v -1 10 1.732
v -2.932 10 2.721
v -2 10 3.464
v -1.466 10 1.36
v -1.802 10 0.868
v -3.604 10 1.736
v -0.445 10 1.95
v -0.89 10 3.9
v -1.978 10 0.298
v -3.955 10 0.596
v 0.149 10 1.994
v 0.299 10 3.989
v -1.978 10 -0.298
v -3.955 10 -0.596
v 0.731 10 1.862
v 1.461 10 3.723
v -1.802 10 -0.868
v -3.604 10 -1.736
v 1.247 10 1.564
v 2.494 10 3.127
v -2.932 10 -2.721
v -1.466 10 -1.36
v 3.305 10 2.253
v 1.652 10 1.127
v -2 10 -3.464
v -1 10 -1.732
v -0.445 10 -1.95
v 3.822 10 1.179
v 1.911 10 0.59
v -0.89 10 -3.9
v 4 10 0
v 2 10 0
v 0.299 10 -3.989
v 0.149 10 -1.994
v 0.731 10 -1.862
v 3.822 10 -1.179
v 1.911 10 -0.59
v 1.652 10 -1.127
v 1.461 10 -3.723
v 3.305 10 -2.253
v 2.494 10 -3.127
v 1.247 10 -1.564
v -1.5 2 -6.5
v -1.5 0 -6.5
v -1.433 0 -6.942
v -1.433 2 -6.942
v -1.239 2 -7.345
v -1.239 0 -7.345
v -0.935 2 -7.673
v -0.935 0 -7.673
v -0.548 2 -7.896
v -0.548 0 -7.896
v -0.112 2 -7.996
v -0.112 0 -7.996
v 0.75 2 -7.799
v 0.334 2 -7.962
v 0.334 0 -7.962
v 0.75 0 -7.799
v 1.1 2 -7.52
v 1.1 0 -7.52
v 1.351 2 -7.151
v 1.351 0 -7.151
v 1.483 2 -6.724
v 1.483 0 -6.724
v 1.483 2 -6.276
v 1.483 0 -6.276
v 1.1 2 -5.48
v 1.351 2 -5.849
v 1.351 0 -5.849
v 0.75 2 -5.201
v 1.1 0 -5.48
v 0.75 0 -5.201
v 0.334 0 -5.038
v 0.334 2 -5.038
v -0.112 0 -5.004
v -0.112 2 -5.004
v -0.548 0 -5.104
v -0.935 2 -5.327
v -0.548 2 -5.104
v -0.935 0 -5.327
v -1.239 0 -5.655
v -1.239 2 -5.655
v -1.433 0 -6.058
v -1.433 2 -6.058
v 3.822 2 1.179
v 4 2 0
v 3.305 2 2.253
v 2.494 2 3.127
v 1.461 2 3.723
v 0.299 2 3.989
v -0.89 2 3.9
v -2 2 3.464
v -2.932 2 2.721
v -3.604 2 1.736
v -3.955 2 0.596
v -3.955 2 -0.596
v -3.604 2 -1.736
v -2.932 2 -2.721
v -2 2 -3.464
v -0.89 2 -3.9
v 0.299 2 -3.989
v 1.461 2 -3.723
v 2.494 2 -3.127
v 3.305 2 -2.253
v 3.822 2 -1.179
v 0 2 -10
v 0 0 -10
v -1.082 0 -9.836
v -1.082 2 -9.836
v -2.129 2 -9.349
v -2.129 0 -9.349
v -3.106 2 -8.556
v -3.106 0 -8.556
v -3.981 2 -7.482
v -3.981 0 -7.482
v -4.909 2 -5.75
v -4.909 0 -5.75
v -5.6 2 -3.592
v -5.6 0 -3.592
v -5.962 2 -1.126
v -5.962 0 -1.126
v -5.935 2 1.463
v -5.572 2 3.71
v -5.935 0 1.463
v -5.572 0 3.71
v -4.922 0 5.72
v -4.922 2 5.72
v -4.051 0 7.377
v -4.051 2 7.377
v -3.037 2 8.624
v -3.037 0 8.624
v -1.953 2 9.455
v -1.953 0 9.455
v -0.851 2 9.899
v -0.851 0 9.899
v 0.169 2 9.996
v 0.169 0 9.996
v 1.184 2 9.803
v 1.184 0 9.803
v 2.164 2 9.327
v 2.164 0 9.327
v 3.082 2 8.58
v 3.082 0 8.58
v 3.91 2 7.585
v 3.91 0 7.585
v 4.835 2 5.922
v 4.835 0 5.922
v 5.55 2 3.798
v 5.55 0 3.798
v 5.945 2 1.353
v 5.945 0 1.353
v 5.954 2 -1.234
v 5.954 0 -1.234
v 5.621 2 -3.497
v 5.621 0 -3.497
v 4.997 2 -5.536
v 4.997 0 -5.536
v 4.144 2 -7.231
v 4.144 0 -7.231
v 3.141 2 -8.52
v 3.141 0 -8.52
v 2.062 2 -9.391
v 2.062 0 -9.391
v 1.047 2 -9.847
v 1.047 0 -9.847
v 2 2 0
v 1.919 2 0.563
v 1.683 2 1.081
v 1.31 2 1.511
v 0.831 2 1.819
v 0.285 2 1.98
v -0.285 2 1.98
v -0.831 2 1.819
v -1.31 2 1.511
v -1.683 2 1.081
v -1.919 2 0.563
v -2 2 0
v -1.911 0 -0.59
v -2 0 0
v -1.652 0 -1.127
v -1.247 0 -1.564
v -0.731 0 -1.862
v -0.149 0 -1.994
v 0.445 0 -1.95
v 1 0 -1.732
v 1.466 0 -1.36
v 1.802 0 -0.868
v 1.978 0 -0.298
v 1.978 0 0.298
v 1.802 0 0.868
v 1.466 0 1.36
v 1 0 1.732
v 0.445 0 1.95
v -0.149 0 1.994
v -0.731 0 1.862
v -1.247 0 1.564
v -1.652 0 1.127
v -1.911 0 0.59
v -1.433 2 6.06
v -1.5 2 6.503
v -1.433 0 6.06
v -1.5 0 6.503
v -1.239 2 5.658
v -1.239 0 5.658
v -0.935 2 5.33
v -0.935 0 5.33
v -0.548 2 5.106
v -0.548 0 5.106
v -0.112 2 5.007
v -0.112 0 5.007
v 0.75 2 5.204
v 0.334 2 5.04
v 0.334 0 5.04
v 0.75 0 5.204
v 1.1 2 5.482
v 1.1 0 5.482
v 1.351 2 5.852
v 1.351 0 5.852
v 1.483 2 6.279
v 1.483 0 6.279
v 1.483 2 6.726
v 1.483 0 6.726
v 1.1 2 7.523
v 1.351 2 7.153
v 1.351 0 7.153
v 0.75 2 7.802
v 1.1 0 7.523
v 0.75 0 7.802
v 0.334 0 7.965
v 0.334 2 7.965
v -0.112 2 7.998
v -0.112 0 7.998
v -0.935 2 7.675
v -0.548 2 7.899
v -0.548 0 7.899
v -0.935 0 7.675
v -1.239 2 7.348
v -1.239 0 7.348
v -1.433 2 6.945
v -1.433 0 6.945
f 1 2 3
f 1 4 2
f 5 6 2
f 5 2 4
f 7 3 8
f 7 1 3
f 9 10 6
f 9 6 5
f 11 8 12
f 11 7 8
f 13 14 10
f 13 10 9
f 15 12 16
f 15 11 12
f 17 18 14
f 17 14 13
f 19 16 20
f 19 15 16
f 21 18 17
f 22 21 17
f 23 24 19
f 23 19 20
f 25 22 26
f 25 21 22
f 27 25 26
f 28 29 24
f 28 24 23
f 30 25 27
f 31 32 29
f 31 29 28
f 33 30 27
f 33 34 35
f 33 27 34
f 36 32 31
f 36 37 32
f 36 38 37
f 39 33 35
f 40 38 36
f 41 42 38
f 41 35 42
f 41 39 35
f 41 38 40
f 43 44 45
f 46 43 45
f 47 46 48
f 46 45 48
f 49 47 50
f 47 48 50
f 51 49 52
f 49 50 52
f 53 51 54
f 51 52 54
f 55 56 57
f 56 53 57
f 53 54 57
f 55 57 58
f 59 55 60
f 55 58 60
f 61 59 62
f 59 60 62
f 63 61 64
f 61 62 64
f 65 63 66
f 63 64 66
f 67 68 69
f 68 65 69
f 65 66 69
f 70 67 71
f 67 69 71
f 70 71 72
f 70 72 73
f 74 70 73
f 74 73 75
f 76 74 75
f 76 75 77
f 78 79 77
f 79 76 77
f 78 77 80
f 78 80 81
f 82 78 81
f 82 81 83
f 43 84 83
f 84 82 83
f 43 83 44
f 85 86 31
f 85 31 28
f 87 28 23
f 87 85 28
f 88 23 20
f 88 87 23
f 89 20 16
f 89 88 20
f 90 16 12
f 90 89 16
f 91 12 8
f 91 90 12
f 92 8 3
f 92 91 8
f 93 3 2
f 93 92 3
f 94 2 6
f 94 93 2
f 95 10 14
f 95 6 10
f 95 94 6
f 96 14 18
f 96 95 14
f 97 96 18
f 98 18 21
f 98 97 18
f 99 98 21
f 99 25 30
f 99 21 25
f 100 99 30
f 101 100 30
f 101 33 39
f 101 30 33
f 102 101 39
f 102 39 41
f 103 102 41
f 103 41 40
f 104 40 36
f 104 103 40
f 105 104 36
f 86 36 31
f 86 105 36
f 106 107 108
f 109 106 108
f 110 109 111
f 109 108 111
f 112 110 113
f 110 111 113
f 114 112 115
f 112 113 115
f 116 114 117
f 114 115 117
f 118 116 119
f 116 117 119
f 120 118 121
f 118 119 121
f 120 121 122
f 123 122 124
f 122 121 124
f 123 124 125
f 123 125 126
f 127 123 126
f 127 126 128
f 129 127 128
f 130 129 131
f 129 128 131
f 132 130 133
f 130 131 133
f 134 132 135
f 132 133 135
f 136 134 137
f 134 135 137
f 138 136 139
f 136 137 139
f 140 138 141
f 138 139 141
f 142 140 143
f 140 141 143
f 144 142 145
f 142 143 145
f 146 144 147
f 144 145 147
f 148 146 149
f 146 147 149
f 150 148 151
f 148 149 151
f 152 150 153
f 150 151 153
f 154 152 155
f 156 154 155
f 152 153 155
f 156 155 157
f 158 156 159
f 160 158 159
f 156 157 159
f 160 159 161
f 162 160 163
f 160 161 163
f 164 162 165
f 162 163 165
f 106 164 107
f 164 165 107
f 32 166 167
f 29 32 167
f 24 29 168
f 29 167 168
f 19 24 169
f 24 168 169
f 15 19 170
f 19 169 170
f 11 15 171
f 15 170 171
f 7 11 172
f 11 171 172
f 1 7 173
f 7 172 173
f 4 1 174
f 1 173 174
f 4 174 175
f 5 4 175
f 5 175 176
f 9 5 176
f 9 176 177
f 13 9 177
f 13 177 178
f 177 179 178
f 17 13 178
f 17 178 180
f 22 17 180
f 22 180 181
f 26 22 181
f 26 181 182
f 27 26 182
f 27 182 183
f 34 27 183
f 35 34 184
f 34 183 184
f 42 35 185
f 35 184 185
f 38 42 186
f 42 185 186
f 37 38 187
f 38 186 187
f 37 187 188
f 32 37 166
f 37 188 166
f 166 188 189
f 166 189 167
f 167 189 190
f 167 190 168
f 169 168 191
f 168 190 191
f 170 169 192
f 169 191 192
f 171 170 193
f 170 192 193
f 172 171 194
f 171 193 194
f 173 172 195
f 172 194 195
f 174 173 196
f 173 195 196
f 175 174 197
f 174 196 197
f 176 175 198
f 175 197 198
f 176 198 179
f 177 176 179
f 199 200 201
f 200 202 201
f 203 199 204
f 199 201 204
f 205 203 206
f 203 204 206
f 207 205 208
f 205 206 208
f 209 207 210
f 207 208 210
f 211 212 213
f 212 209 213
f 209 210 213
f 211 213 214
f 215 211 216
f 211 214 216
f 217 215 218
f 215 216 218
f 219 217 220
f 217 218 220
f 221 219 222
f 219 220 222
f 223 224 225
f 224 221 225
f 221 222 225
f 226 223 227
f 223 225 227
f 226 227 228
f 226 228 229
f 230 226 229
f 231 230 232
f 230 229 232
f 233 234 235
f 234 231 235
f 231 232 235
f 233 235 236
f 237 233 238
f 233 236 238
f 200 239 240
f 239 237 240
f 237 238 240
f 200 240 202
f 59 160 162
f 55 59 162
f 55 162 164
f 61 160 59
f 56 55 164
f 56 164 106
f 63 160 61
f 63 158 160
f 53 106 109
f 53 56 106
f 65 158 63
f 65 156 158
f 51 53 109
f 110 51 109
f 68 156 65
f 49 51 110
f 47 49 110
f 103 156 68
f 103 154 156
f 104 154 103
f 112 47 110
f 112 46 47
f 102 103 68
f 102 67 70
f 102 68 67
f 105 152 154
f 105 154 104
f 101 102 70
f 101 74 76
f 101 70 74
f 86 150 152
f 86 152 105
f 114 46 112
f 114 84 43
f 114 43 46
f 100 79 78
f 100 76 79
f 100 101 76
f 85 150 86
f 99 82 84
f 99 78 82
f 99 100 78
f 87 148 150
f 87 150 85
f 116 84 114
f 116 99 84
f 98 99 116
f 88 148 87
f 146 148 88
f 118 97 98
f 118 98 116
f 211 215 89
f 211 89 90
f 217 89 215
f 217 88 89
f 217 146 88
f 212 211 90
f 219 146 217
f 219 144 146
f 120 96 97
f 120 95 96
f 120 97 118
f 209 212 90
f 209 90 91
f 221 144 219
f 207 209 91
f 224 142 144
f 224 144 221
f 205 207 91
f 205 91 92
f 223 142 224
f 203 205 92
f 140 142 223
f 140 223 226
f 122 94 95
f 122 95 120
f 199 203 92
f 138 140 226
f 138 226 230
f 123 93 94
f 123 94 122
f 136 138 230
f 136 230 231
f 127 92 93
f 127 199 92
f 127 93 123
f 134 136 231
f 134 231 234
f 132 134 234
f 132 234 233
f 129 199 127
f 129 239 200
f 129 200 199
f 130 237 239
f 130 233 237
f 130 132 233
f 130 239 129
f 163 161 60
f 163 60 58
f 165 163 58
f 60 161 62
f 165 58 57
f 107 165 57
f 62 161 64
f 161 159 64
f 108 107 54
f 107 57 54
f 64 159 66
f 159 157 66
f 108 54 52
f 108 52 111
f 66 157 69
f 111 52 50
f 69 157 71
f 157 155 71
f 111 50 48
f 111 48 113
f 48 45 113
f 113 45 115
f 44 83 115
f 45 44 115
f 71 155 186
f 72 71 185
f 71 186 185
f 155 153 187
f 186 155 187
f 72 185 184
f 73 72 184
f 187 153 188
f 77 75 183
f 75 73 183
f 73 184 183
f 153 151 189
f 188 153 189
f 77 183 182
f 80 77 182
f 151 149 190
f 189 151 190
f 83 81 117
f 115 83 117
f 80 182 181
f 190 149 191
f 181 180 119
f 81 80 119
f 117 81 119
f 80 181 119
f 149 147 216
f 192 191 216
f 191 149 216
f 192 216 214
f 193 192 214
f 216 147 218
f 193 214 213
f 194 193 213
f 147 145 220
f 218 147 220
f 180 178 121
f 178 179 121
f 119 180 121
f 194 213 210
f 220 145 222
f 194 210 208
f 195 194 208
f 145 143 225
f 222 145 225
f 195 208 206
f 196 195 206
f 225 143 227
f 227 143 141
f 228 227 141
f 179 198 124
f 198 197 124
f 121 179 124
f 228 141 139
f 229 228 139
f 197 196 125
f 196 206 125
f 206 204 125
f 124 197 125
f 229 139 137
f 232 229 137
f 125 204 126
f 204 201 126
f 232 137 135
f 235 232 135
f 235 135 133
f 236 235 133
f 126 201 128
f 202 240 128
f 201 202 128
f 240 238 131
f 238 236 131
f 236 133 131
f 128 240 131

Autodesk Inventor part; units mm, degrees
ref_plane "YZ Plane" through (0, 0, 0) normal (1, 0, 0) x (0, 1, 0)
ref_plane "XZ Plane" through (0, 0, 0) normal (0, 1, 0) x (-1, 0, 0)
ref_plane "XY Plane" through (0, 0, 0) normal (0, 0, 1) x (1, 0, 0)
sketch "Sketch3" plane through (0, 0, 0) normal (0, 1, 0) x (-1, 0, 0)
  ellipse E0 centre (0, 0) end of major axis (0, -10) minor radius 6
  circle A0 centre (0, 0) radius 2
  circle A1 centre (0, 6.5026) radius 1.5
  circle A2 centre (0, -6.5) radius 1.5
  dimension "d0" = 6
  dimension "d3" = 10
  dimension "d2" = 4
  dimension "d5" = 3
  dimension "d9" = 6.5026
  dimension "d11" = 3
  dimension "d12" = 6.5
extrude "Extrusion1" add sketch "Sketch3" along normal blind 2
sketch "Sketch4" plane through (0, 2, 0) normal (0, 1, 0) x (1, 0, 0)
  circle A0 centre (0, 0) radius 4
  circle A1 centre (0, 0) radius 2
  dimension "d15" = 8
  dimension "d16" = 4
extrude "Extrusion2" add sketch "Sketch4" along normal blind 8
properties part number "reverse gear blands"
